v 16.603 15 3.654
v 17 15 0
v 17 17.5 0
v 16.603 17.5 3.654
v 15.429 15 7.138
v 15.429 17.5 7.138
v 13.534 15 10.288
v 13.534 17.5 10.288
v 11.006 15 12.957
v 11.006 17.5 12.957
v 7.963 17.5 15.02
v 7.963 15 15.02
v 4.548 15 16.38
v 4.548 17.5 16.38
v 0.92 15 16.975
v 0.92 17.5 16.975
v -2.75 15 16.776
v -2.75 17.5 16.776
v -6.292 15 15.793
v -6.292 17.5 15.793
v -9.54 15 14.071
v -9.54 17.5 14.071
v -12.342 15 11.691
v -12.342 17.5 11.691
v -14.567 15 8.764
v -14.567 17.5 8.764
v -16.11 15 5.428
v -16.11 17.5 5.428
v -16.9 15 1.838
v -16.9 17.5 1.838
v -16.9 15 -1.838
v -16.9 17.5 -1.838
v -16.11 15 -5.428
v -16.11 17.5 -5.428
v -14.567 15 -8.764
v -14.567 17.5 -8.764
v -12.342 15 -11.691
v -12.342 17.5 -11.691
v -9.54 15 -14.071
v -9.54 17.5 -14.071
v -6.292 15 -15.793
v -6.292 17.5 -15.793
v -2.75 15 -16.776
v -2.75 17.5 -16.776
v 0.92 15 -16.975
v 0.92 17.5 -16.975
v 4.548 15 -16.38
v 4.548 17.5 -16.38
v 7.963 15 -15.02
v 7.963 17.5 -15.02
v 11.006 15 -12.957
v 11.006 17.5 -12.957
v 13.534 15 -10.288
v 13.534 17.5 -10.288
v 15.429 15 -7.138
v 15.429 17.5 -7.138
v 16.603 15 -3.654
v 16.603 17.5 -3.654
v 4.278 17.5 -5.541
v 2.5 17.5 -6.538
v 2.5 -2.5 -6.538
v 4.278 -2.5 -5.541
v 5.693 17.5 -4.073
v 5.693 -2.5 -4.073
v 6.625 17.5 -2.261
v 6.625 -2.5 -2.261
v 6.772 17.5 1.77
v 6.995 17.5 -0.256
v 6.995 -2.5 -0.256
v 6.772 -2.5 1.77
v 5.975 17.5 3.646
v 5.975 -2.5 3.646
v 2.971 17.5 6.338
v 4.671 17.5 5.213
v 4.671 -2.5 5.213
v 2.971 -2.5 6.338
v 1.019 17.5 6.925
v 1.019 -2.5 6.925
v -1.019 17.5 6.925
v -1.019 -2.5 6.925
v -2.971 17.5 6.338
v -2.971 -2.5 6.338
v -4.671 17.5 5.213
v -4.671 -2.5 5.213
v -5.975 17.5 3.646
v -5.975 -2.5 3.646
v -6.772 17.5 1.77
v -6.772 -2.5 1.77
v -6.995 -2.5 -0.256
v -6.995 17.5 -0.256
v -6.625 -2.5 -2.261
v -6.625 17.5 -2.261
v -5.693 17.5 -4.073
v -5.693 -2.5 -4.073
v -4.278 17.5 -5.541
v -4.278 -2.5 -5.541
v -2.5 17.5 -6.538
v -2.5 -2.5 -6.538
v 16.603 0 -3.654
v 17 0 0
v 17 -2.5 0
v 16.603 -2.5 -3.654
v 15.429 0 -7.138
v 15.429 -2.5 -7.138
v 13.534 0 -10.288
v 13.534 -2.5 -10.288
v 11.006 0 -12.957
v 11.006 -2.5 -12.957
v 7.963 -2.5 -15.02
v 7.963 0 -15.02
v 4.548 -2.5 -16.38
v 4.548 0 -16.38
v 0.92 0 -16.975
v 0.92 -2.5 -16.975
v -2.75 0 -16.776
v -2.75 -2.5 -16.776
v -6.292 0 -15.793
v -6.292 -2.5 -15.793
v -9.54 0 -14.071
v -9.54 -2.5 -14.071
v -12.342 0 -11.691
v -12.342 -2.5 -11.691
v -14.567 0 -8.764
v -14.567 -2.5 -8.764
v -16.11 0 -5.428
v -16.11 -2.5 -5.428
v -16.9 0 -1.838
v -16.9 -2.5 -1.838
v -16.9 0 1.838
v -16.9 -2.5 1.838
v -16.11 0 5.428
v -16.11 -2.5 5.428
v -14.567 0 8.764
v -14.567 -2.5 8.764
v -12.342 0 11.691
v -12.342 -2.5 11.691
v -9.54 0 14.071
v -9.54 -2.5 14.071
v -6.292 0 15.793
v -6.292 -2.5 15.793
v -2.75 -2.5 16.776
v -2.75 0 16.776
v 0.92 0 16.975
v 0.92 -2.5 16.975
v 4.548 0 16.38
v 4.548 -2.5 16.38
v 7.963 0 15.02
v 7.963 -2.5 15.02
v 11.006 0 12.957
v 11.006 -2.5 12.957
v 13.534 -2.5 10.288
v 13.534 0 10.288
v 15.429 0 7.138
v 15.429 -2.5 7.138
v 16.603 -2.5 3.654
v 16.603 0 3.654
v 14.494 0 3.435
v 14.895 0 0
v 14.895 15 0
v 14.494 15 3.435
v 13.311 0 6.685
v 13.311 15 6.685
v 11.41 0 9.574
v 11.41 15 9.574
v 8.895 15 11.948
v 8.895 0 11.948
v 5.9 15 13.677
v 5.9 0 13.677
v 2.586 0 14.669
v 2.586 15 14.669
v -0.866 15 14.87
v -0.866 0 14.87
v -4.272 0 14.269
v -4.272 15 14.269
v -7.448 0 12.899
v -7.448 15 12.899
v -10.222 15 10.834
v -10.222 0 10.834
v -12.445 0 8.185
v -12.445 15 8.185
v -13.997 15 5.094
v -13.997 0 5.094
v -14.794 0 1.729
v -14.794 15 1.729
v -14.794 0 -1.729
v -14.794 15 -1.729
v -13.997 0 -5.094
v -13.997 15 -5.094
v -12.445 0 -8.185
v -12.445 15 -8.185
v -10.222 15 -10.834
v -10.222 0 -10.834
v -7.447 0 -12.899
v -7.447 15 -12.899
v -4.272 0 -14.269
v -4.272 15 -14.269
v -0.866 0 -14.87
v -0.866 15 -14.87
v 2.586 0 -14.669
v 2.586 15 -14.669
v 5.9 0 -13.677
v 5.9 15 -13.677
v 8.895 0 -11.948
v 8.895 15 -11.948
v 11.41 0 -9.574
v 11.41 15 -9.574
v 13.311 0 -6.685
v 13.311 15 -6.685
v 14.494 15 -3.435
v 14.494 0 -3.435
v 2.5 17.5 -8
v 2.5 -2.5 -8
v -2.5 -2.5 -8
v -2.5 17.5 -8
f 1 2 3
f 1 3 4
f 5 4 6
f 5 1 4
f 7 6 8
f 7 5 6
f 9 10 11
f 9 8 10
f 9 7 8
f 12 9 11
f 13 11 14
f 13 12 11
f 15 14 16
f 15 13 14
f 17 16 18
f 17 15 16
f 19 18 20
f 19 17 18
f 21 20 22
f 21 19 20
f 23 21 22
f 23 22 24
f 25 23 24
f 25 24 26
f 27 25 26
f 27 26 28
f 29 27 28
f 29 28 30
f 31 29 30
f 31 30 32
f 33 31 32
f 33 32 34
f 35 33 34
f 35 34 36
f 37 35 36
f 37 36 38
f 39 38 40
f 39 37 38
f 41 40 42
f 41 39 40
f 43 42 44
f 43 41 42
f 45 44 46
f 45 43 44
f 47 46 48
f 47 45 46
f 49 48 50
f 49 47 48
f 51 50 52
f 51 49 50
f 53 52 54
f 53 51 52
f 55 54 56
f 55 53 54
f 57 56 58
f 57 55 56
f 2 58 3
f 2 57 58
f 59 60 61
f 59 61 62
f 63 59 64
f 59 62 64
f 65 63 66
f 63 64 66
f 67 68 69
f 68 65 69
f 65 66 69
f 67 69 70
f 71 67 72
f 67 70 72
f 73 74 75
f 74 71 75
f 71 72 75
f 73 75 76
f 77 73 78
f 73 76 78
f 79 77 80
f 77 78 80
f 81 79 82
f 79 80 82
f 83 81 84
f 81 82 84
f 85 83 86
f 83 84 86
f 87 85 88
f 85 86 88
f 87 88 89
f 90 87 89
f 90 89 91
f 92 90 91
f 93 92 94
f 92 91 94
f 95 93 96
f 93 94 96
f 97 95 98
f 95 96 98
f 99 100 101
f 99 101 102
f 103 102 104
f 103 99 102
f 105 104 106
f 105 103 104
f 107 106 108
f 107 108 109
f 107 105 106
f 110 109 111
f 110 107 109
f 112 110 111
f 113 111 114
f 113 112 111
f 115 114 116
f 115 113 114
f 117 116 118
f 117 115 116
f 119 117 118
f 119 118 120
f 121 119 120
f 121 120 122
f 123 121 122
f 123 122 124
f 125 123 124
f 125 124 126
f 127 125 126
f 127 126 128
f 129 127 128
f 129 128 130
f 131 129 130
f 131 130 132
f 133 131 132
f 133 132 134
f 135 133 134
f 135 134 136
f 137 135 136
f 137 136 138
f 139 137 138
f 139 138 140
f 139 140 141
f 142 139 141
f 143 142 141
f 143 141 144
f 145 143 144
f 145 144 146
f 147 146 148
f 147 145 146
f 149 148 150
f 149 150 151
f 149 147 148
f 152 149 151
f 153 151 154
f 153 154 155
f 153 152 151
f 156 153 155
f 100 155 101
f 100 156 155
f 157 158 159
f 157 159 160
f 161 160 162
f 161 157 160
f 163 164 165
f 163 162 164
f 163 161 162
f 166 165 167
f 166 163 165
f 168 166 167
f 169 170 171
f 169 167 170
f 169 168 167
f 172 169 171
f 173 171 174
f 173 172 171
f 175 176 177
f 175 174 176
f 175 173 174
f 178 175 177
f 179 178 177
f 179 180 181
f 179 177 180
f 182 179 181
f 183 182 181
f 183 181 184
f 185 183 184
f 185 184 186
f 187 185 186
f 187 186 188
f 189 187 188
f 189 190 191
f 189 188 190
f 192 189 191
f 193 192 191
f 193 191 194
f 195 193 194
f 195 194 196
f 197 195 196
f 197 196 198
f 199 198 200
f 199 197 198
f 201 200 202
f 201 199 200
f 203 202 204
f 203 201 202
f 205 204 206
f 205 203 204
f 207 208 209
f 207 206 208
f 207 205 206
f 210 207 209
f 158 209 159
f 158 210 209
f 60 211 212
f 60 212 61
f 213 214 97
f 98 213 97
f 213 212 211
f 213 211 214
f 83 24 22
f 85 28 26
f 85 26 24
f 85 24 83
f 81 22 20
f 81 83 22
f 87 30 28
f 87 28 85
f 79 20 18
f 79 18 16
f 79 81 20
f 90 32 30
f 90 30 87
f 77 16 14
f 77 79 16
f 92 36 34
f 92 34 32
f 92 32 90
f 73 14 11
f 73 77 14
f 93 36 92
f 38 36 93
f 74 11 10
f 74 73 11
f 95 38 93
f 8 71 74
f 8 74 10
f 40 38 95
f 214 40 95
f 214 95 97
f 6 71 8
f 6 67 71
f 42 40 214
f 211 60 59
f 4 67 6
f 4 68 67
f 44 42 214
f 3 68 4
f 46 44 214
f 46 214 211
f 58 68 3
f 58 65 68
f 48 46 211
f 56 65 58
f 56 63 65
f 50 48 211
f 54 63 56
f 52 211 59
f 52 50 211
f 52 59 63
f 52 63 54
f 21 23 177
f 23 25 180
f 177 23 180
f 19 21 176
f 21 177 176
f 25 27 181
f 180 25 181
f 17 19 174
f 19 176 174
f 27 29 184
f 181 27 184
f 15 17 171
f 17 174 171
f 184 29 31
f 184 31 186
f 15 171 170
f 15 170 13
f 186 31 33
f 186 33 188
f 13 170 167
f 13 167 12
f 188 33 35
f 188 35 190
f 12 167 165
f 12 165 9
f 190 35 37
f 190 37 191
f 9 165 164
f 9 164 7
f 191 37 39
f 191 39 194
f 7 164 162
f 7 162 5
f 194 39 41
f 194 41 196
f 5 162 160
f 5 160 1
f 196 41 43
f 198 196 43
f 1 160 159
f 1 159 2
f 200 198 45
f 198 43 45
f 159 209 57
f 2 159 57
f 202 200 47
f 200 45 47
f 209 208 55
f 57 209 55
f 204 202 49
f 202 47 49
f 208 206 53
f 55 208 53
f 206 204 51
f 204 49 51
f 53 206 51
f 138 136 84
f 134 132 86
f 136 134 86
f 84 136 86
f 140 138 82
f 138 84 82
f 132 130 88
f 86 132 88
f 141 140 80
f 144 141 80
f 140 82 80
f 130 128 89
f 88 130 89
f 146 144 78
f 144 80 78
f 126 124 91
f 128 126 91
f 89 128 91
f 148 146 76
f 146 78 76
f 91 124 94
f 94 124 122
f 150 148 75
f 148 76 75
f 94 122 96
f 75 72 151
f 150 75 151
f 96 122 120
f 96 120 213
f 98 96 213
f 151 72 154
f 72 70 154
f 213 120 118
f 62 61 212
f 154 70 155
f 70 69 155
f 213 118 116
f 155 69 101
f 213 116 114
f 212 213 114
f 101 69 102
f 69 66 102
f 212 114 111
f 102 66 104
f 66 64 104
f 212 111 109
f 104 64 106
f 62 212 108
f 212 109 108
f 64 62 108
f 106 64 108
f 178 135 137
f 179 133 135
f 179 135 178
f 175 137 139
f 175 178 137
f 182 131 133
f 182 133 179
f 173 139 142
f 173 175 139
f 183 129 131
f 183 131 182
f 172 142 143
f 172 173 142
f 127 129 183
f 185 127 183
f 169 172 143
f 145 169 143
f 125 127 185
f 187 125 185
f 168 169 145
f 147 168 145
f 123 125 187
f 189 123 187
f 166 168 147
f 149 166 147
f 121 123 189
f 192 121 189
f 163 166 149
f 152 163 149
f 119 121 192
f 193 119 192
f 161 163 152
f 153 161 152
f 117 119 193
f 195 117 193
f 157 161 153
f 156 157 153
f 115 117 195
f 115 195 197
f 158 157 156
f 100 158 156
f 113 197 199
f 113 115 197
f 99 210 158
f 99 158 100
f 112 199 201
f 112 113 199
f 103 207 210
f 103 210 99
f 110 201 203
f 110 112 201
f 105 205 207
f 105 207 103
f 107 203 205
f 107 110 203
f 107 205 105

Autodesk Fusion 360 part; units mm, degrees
sketch "Sketch1" plane through (0, 0, 0) normal (0, 1, 0) x (1, 0, 0)
  circle A0 centre (0, 0) radius 17
  circle A1 centre (0, 0) radius 14.895
  line L0 (0, 0) -> (0, 8) construction
  line L1 (0, 8) -> (2.5, 8)
  line L2 (2.5, 8) -> (2.5, 6.5383)
  line L3 (0, 8) -> (-2.5, 8)
  line L4 (-2.5, 8) -> (-2.5, 6.5383)
  arc A2 (-2.5, 6.5383) -> (2.5, 6.5383) centre (0, 0) ccw
  dimension "d1" = 34
  dimension "d2" = 29.79
  dimension "d3" = 14
  dimension "d4" = 2.5
  dimension "d5" = 2.5
  dimension "d6" = 8
extrude "Extrude1" add sketch "Sketch1" against normal blind 2.5 contours A0 | A1
extrude "Extrude2" add sketch "Sketch1" along normal blind 15 contours A1
extrude "Extrude3" add sketch "Sketch1" along normal blind 2.5 from surface at 15 contours A0 | A1
